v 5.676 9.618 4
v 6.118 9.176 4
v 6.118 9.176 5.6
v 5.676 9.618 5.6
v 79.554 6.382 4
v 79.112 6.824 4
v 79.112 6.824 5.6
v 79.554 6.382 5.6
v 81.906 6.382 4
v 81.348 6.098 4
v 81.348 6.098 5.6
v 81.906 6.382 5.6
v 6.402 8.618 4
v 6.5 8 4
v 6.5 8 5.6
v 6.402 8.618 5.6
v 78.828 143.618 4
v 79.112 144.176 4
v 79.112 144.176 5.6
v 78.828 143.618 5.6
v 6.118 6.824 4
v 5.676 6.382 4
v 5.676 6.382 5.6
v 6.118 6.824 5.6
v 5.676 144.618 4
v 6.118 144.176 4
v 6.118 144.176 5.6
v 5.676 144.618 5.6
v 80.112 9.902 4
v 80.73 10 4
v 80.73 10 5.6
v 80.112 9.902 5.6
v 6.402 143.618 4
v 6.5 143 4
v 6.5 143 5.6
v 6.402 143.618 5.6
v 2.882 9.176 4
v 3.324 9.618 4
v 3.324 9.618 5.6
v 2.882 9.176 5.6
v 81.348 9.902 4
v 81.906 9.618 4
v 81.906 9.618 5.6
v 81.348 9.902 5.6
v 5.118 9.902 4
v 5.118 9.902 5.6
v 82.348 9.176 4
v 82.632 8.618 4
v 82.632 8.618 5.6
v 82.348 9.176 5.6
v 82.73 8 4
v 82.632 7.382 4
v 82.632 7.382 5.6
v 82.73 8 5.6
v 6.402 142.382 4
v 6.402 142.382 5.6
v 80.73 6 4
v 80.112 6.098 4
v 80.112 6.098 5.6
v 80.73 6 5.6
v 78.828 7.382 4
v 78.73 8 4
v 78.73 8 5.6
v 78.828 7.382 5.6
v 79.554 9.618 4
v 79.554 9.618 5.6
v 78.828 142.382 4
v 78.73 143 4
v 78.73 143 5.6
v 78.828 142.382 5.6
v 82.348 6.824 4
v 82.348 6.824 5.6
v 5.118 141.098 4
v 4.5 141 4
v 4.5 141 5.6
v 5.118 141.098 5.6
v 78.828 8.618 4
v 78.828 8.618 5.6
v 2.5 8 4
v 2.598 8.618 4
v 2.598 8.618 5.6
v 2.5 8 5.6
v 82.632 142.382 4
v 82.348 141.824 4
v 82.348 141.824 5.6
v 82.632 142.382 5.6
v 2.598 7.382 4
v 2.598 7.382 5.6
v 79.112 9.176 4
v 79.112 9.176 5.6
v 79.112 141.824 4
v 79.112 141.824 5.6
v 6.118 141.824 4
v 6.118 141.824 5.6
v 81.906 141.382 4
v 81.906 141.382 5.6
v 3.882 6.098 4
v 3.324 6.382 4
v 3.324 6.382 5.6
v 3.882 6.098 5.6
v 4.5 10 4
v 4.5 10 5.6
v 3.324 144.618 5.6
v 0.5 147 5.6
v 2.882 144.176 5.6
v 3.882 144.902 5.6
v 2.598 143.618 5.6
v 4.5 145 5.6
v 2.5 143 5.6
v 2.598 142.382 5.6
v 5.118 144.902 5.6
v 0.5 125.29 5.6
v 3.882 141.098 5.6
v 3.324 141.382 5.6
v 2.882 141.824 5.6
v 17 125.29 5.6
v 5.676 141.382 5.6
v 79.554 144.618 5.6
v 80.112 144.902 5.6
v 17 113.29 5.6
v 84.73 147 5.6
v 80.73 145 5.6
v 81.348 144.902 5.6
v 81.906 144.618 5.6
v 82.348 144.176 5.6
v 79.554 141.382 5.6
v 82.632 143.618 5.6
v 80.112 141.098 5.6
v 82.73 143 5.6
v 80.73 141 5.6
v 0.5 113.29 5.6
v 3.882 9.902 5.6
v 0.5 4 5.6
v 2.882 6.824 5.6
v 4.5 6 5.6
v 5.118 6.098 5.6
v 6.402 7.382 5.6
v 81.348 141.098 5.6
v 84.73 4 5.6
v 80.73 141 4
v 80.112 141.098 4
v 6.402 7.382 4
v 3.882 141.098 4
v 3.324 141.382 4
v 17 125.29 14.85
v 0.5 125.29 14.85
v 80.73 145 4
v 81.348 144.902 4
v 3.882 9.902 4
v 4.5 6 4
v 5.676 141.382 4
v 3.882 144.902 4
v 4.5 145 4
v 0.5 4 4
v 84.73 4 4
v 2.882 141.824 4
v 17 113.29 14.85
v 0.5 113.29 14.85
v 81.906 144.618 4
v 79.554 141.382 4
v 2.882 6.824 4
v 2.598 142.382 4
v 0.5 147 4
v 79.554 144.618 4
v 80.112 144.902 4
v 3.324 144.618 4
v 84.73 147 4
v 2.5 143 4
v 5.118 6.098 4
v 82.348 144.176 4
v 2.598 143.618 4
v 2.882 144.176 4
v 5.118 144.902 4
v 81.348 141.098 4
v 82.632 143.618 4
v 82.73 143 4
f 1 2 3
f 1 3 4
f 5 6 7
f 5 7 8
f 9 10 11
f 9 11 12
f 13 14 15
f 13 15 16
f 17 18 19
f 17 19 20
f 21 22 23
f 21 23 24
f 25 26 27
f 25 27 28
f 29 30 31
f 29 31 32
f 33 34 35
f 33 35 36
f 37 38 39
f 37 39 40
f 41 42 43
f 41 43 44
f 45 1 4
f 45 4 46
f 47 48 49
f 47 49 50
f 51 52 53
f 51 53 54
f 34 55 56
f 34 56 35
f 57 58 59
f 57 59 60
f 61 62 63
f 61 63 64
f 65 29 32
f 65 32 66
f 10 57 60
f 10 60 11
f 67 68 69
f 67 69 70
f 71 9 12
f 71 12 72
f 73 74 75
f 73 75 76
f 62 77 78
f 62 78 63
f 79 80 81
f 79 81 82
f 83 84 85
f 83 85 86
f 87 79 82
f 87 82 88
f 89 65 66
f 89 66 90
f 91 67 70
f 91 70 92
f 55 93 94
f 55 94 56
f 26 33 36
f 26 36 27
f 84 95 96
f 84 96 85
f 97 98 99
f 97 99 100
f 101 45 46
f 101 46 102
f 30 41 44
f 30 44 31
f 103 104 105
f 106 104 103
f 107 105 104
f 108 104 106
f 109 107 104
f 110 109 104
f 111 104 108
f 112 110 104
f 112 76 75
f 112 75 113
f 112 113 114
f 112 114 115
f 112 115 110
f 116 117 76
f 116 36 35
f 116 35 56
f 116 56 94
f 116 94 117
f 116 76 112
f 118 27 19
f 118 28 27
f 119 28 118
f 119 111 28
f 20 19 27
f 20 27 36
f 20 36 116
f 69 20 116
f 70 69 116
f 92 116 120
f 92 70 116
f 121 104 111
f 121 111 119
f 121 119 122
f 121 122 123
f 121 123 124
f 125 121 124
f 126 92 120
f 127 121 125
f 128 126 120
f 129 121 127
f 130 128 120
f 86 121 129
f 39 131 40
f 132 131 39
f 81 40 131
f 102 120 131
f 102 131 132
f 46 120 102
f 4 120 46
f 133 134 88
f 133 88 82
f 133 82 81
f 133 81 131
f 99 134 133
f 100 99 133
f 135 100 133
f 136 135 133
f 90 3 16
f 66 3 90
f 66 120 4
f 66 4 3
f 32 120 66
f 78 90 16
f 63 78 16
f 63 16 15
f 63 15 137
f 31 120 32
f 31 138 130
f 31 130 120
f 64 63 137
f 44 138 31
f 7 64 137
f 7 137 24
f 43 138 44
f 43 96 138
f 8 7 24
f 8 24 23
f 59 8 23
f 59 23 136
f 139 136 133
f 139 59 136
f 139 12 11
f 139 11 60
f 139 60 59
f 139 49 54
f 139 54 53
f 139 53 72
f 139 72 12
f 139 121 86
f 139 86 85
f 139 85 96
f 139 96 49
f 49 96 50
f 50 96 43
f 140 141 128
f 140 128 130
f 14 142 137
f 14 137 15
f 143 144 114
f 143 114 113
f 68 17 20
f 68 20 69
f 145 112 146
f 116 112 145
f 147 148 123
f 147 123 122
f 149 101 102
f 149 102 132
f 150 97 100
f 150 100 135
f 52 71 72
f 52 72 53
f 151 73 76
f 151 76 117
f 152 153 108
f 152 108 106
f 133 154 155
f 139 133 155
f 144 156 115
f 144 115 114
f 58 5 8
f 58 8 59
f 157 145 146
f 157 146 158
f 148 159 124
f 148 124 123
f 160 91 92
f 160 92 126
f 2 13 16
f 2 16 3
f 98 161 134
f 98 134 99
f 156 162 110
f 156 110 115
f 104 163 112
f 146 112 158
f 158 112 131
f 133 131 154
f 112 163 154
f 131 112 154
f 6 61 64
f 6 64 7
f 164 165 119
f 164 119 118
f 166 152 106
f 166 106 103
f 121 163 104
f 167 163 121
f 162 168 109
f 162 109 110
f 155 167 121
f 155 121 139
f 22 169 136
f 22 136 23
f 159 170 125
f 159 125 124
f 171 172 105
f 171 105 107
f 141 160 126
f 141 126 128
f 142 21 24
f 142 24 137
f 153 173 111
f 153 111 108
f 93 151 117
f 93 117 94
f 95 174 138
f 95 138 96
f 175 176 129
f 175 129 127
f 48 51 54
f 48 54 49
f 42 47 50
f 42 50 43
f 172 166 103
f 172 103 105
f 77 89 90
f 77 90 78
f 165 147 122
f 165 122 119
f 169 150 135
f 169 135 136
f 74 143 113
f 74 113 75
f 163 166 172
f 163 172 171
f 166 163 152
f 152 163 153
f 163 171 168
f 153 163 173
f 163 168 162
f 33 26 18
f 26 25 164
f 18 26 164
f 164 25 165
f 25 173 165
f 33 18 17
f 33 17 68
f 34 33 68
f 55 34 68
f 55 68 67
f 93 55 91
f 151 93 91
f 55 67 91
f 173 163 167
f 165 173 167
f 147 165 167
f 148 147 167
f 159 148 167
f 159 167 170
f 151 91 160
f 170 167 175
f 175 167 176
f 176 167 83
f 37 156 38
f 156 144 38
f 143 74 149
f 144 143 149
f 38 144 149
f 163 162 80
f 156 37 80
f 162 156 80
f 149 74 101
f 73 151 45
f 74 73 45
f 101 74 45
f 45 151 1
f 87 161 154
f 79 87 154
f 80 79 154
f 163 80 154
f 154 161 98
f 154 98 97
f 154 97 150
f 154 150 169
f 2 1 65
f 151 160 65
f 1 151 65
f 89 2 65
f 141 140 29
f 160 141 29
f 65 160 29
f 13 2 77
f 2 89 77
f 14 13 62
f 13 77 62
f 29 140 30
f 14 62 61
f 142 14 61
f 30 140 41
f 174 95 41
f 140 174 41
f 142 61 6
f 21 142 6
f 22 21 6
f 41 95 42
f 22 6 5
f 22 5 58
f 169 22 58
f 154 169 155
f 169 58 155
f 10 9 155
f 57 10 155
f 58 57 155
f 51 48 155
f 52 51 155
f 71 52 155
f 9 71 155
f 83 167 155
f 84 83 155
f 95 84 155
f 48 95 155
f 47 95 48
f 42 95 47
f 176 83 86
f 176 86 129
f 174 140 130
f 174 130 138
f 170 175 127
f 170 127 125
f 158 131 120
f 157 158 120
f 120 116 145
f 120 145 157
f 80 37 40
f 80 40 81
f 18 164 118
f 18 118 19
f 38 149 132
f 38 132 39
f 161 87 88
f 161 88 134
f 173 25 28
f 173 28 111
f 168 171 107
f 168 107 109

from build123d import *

# Parameters (mm, degrees)
PRISM001_DEPTH             = 10
PRISM002_DEPTH             = 10
PRISM003_DEPTH             = 10
PRISM_DEPTH                = 10
CUBE001_W                  = 12
CUBE001_H                  = 16.5
CUBE001_DEPTH              = 10.85
CUBE_W                     = 143
CUBE_H                     = 84.23
CUBE_DEPTH                 = 1.6
DIFFERENCE_PLACEMENT_ANGLE = -90


with BuildPart() as prism001:
    # prism001 → prism001 (new body)
    with BuildSketch(Plane(origin=(139, 4, -1), x_dir=(1, 0, 0), z_dir=(0, 0, 1))):
        Polygon((2, 0), (1.902113, 0.618034), (1.618034, 1.175571), (1.175571, 1.618034), (0.618034, 1.902113), (0, 2), (-0.618034, 1.902113), (-1.175571, 1.618034), (-1.618034, 1.175571), (-1.902113, 0.618034), (-2, 0), (-1.902113, -0.618034), (-1.618034, -1.175571), (-1.175571, -1.618034), (-0.618034, -1.902113), (0, -2), (0.618034, -1.902113), (1.175571, -1.618034), (1.618034, -1.175571), (1.902113, -0.618034), align=None)
    extrude(amount=PRISM001_DEPTH)


with BuildPart() as prism002:
    # prism002 → prism002 (new body)
    with BuildSketch(Plane(origin=(4, 80.23, -1), x_dir=(1, 0, 0), z_dir=(0, 0, 1))):
        Polygon((2, 0), (1.902113, 0.618034), (1.618034, 1.175571), (1.175571, 1.618034), (0.618034, 1.902113), (0, 2), (-0.618034, 1.902113), (-1.175571, 1.618034), (-1.618034, 1.175571), (-1.902113, 0.618034), (-2, 0), (-1.902113, -0.618034), (-1.618034, -1.175571), (-1.175571, -1.618034), (-0.618034, -1.902113), (0, -2), (0.618034, -1.902113), (1.175571, -1.618034), (1.618034, -1.175571), (1.902113, -0.618034), align=None)
    extrude(amount=PRISM002_DEPTH)


with BuildPart() as prism003:
    # prism003 → prism003 (new body)
    with BuildSketch(Plane(origin=(139, 80.23, -1), x_dir=(1, 0, 0), z_dir=(0, 0, 1))):
        Polygon((2, 0), (1.902113, 0.618034), (1.618034, 1.175571), (1.175571, 1.618034), (0.618034, 1.902113), (0, 2), (-0.618034, 1.902113), (-1.175571, 1.618034), (-1.618034, 1.175571), (-1.902113, 0.618034), (-2, 0), (-1.902113, -0.618034), (-1.618034, -1.175571), (-1.175571, -1.618034), (-0.618034, -1.902113), (0, -2), (0.618034, -1.902113), (1.175571, -1.618034), (1.618034, -1.175571), (1.902113, -0.618034), align=None)
    extrude(amount=PRISM003_DEPTH)


with BuildPart() as group002:
    # prism → prism (new body)
    with BuildSketch(Plane(origin=(4, 4, -1), x_dir=(1, 0, 0), z_dir=(0, 0, 1))):
        Polygon((2, 0), (1.902113, 0.618034), (1.618034, 1.175571), (1.175571, 1.618034), (0.618034, 1.902113), (0, 2), (-0.618034, 1.902113), (-1.175571, 1.618034), (-1.618034, 1.175571), (-1.902113, 0.618034), (-2, 0), (-1.902113, -0.618034), (-1.618034, -1.175571), (-1.175571, -1.618034), (-0.618034, -1.902113), (0, -2), (0.618034, -1.902113), (1.175571, -1.618034), (1.618034, -1.175571), (1.902113, -0.618034), align=None)
    extrude(amount=PRISM_DEPTH)

    # Group002: union prism001, prism002, prism003
    add(prism001.part)
    add(prism002.part)
    add(prism003.part)


with BuildPart() as cube001:
    # cube001 → cube001 (new body)
    with BuildSketch(Plane(origin=(21.71, 0, 0), x_dir=(1, 0, 0), z_dir=(0, 0, 1))):
        with Locations((6, 8.25)):
            Rectangle(CUBE001_W, CUBE001_H)
    extrude(amount=CUBE001_DEPTH)


with BuildPart() as mks_gen_14_dummy:
    # cube → cube (new body)
    with BuildSketch(Plane.XY):
        with Locations((71.5, 42.115)):
            Rectangle(CUBE_W, CUBE_H)
    extrude(amount=CUBE_DEPTH)

    # Group001: union cube001
    add(cube001.part)

    # difference: cut Group002
    add(group002.part, mode=Mode.SUBTRACT)


with BuildPart() as mks_gen_14_dummy_1:
    # difference placement: moved
    add(mks_gen_14_dummy.part.moved(Location((0.5, 147, 4))).rotate(Axis((0.5, 147, 4), (0, 0, 1)), DIFFERENCE_PLACEMENT_ANGLE))


solid = mks_gen_14_dummy_1.part
